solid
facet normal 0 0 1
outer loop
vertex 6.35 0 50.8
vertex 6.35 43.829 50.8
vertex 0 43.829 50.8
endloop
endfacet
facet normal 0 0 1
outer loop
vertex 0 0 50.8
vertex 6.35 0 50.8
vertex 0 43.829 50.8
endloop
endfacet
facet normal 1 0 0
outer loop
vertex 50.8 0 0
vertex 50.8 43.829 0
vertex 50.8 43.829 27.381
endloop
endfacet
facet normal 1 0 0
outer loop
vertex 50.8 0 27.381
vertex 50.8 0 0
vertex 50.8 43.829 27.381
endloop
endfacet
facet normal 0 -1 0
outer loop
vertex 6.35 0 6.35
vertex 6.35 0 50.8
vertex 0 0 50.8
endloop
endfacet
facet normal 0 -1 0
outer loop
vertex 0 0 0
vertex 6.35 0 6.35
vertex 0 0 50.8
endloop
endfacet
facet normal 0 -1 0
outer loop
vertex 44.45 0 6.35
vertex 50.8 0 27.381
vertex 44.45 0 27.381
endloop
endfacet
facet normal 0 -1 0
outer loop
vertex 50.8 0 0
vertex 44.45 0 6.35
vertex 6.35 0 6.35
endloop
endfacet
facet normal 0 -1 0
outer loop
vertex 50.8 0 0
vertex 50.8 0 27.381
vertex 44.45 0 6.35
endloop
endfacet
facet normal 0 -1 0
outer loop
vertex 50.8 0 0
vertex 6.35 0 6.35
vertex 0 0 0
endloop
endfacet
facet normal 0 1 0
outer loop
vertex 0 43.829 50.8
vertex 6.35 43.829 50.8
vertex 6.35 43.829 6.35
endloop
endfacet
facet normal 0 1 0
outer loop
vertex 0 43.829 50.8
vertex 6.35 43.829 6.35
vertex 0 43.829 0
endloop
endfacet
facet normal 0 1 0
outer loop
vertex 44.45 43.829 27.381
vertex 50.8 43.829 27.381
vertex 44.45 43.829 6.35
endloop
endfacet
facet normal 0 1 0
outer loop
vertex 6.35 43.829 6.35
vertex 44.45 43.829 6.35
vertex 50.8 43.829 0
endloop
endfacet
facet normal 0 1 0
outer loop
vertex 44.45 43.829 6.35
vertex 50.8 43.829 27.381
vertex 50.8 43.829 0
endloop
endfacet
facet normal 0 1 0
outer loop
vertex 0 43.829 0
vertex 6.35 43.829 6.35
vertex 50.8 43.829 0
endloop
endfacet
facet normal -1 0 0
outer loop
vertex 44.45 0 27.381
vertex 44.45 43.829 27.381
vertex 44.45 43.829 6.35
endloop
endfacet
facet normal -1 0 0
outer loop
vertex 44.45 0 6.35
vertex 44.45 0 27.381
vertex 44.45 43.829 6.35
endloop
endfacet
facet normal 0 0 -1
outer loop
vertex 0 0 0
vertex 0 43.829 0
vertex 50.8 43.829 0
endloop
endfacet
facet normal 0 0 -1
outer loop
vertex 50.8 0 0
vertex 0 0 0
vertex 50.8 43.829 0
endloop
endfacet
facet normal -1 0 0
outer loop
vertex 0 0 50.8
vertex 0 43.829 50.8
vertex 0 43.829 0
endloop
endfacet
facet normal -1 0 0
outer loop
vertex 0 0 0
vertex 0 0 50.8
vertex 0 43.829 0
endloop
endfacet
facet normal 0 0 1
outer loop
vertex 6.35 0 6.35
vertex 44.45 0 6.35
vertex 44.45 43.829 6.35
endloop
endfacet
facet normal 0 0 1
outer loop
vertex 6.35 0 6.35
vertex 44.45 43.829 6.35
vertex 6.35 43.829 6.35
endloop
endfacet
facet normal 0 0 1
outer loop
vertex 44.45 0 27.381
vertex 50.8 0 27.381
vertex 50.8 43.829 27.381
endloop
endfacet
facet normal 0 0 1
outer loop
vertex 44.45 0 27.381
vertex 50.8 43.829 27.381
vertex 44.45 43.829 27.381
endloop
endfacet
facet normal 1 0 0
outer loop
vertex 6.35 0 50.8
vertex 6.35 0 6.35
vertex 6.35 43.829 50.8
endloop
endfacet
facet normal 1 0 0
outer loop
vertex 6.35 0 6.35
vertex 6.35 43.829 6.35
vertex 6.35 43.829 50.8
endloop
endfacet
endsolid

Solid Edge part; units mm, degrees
sketch "Sketch1" plane through (0, 0, 0) normal (1, 0, 0) x (0, 1, 0)
  line L0 (0, 0) -> (43.8289, 0)
sketch "Sketch2" plane through (0, 0, 0) normal (0, -1, 0) x (1, 0, 0)
  line L0 (0, 50.8) -> (0, 0)
  line L1 (0, 0) -> (50.8, 0)
  line L2 (50.8, 27.381) -> (50.8, 0)
  line L3 (44.45, 27.381) -> (50.8, 27.381)
  line L4 (44.45, 6.35) -> (44.45, 27.381)
  line L5 (44.45, 6.35) -> (6.35, 6.35)
  line L6 (6.35, 6.35) -> (6.35, 50.8)
  line L7 (6.35, 50.8) -> (0, 50.8)
  dimension "D1" = 50.8
  dimension "D2" = 6.35
  dimension "D3" = 50.8
  dimension "D4" = 27.381
sweep "SweptProtrusion_1" add profiles "Sketch2" path "Sketch1"
